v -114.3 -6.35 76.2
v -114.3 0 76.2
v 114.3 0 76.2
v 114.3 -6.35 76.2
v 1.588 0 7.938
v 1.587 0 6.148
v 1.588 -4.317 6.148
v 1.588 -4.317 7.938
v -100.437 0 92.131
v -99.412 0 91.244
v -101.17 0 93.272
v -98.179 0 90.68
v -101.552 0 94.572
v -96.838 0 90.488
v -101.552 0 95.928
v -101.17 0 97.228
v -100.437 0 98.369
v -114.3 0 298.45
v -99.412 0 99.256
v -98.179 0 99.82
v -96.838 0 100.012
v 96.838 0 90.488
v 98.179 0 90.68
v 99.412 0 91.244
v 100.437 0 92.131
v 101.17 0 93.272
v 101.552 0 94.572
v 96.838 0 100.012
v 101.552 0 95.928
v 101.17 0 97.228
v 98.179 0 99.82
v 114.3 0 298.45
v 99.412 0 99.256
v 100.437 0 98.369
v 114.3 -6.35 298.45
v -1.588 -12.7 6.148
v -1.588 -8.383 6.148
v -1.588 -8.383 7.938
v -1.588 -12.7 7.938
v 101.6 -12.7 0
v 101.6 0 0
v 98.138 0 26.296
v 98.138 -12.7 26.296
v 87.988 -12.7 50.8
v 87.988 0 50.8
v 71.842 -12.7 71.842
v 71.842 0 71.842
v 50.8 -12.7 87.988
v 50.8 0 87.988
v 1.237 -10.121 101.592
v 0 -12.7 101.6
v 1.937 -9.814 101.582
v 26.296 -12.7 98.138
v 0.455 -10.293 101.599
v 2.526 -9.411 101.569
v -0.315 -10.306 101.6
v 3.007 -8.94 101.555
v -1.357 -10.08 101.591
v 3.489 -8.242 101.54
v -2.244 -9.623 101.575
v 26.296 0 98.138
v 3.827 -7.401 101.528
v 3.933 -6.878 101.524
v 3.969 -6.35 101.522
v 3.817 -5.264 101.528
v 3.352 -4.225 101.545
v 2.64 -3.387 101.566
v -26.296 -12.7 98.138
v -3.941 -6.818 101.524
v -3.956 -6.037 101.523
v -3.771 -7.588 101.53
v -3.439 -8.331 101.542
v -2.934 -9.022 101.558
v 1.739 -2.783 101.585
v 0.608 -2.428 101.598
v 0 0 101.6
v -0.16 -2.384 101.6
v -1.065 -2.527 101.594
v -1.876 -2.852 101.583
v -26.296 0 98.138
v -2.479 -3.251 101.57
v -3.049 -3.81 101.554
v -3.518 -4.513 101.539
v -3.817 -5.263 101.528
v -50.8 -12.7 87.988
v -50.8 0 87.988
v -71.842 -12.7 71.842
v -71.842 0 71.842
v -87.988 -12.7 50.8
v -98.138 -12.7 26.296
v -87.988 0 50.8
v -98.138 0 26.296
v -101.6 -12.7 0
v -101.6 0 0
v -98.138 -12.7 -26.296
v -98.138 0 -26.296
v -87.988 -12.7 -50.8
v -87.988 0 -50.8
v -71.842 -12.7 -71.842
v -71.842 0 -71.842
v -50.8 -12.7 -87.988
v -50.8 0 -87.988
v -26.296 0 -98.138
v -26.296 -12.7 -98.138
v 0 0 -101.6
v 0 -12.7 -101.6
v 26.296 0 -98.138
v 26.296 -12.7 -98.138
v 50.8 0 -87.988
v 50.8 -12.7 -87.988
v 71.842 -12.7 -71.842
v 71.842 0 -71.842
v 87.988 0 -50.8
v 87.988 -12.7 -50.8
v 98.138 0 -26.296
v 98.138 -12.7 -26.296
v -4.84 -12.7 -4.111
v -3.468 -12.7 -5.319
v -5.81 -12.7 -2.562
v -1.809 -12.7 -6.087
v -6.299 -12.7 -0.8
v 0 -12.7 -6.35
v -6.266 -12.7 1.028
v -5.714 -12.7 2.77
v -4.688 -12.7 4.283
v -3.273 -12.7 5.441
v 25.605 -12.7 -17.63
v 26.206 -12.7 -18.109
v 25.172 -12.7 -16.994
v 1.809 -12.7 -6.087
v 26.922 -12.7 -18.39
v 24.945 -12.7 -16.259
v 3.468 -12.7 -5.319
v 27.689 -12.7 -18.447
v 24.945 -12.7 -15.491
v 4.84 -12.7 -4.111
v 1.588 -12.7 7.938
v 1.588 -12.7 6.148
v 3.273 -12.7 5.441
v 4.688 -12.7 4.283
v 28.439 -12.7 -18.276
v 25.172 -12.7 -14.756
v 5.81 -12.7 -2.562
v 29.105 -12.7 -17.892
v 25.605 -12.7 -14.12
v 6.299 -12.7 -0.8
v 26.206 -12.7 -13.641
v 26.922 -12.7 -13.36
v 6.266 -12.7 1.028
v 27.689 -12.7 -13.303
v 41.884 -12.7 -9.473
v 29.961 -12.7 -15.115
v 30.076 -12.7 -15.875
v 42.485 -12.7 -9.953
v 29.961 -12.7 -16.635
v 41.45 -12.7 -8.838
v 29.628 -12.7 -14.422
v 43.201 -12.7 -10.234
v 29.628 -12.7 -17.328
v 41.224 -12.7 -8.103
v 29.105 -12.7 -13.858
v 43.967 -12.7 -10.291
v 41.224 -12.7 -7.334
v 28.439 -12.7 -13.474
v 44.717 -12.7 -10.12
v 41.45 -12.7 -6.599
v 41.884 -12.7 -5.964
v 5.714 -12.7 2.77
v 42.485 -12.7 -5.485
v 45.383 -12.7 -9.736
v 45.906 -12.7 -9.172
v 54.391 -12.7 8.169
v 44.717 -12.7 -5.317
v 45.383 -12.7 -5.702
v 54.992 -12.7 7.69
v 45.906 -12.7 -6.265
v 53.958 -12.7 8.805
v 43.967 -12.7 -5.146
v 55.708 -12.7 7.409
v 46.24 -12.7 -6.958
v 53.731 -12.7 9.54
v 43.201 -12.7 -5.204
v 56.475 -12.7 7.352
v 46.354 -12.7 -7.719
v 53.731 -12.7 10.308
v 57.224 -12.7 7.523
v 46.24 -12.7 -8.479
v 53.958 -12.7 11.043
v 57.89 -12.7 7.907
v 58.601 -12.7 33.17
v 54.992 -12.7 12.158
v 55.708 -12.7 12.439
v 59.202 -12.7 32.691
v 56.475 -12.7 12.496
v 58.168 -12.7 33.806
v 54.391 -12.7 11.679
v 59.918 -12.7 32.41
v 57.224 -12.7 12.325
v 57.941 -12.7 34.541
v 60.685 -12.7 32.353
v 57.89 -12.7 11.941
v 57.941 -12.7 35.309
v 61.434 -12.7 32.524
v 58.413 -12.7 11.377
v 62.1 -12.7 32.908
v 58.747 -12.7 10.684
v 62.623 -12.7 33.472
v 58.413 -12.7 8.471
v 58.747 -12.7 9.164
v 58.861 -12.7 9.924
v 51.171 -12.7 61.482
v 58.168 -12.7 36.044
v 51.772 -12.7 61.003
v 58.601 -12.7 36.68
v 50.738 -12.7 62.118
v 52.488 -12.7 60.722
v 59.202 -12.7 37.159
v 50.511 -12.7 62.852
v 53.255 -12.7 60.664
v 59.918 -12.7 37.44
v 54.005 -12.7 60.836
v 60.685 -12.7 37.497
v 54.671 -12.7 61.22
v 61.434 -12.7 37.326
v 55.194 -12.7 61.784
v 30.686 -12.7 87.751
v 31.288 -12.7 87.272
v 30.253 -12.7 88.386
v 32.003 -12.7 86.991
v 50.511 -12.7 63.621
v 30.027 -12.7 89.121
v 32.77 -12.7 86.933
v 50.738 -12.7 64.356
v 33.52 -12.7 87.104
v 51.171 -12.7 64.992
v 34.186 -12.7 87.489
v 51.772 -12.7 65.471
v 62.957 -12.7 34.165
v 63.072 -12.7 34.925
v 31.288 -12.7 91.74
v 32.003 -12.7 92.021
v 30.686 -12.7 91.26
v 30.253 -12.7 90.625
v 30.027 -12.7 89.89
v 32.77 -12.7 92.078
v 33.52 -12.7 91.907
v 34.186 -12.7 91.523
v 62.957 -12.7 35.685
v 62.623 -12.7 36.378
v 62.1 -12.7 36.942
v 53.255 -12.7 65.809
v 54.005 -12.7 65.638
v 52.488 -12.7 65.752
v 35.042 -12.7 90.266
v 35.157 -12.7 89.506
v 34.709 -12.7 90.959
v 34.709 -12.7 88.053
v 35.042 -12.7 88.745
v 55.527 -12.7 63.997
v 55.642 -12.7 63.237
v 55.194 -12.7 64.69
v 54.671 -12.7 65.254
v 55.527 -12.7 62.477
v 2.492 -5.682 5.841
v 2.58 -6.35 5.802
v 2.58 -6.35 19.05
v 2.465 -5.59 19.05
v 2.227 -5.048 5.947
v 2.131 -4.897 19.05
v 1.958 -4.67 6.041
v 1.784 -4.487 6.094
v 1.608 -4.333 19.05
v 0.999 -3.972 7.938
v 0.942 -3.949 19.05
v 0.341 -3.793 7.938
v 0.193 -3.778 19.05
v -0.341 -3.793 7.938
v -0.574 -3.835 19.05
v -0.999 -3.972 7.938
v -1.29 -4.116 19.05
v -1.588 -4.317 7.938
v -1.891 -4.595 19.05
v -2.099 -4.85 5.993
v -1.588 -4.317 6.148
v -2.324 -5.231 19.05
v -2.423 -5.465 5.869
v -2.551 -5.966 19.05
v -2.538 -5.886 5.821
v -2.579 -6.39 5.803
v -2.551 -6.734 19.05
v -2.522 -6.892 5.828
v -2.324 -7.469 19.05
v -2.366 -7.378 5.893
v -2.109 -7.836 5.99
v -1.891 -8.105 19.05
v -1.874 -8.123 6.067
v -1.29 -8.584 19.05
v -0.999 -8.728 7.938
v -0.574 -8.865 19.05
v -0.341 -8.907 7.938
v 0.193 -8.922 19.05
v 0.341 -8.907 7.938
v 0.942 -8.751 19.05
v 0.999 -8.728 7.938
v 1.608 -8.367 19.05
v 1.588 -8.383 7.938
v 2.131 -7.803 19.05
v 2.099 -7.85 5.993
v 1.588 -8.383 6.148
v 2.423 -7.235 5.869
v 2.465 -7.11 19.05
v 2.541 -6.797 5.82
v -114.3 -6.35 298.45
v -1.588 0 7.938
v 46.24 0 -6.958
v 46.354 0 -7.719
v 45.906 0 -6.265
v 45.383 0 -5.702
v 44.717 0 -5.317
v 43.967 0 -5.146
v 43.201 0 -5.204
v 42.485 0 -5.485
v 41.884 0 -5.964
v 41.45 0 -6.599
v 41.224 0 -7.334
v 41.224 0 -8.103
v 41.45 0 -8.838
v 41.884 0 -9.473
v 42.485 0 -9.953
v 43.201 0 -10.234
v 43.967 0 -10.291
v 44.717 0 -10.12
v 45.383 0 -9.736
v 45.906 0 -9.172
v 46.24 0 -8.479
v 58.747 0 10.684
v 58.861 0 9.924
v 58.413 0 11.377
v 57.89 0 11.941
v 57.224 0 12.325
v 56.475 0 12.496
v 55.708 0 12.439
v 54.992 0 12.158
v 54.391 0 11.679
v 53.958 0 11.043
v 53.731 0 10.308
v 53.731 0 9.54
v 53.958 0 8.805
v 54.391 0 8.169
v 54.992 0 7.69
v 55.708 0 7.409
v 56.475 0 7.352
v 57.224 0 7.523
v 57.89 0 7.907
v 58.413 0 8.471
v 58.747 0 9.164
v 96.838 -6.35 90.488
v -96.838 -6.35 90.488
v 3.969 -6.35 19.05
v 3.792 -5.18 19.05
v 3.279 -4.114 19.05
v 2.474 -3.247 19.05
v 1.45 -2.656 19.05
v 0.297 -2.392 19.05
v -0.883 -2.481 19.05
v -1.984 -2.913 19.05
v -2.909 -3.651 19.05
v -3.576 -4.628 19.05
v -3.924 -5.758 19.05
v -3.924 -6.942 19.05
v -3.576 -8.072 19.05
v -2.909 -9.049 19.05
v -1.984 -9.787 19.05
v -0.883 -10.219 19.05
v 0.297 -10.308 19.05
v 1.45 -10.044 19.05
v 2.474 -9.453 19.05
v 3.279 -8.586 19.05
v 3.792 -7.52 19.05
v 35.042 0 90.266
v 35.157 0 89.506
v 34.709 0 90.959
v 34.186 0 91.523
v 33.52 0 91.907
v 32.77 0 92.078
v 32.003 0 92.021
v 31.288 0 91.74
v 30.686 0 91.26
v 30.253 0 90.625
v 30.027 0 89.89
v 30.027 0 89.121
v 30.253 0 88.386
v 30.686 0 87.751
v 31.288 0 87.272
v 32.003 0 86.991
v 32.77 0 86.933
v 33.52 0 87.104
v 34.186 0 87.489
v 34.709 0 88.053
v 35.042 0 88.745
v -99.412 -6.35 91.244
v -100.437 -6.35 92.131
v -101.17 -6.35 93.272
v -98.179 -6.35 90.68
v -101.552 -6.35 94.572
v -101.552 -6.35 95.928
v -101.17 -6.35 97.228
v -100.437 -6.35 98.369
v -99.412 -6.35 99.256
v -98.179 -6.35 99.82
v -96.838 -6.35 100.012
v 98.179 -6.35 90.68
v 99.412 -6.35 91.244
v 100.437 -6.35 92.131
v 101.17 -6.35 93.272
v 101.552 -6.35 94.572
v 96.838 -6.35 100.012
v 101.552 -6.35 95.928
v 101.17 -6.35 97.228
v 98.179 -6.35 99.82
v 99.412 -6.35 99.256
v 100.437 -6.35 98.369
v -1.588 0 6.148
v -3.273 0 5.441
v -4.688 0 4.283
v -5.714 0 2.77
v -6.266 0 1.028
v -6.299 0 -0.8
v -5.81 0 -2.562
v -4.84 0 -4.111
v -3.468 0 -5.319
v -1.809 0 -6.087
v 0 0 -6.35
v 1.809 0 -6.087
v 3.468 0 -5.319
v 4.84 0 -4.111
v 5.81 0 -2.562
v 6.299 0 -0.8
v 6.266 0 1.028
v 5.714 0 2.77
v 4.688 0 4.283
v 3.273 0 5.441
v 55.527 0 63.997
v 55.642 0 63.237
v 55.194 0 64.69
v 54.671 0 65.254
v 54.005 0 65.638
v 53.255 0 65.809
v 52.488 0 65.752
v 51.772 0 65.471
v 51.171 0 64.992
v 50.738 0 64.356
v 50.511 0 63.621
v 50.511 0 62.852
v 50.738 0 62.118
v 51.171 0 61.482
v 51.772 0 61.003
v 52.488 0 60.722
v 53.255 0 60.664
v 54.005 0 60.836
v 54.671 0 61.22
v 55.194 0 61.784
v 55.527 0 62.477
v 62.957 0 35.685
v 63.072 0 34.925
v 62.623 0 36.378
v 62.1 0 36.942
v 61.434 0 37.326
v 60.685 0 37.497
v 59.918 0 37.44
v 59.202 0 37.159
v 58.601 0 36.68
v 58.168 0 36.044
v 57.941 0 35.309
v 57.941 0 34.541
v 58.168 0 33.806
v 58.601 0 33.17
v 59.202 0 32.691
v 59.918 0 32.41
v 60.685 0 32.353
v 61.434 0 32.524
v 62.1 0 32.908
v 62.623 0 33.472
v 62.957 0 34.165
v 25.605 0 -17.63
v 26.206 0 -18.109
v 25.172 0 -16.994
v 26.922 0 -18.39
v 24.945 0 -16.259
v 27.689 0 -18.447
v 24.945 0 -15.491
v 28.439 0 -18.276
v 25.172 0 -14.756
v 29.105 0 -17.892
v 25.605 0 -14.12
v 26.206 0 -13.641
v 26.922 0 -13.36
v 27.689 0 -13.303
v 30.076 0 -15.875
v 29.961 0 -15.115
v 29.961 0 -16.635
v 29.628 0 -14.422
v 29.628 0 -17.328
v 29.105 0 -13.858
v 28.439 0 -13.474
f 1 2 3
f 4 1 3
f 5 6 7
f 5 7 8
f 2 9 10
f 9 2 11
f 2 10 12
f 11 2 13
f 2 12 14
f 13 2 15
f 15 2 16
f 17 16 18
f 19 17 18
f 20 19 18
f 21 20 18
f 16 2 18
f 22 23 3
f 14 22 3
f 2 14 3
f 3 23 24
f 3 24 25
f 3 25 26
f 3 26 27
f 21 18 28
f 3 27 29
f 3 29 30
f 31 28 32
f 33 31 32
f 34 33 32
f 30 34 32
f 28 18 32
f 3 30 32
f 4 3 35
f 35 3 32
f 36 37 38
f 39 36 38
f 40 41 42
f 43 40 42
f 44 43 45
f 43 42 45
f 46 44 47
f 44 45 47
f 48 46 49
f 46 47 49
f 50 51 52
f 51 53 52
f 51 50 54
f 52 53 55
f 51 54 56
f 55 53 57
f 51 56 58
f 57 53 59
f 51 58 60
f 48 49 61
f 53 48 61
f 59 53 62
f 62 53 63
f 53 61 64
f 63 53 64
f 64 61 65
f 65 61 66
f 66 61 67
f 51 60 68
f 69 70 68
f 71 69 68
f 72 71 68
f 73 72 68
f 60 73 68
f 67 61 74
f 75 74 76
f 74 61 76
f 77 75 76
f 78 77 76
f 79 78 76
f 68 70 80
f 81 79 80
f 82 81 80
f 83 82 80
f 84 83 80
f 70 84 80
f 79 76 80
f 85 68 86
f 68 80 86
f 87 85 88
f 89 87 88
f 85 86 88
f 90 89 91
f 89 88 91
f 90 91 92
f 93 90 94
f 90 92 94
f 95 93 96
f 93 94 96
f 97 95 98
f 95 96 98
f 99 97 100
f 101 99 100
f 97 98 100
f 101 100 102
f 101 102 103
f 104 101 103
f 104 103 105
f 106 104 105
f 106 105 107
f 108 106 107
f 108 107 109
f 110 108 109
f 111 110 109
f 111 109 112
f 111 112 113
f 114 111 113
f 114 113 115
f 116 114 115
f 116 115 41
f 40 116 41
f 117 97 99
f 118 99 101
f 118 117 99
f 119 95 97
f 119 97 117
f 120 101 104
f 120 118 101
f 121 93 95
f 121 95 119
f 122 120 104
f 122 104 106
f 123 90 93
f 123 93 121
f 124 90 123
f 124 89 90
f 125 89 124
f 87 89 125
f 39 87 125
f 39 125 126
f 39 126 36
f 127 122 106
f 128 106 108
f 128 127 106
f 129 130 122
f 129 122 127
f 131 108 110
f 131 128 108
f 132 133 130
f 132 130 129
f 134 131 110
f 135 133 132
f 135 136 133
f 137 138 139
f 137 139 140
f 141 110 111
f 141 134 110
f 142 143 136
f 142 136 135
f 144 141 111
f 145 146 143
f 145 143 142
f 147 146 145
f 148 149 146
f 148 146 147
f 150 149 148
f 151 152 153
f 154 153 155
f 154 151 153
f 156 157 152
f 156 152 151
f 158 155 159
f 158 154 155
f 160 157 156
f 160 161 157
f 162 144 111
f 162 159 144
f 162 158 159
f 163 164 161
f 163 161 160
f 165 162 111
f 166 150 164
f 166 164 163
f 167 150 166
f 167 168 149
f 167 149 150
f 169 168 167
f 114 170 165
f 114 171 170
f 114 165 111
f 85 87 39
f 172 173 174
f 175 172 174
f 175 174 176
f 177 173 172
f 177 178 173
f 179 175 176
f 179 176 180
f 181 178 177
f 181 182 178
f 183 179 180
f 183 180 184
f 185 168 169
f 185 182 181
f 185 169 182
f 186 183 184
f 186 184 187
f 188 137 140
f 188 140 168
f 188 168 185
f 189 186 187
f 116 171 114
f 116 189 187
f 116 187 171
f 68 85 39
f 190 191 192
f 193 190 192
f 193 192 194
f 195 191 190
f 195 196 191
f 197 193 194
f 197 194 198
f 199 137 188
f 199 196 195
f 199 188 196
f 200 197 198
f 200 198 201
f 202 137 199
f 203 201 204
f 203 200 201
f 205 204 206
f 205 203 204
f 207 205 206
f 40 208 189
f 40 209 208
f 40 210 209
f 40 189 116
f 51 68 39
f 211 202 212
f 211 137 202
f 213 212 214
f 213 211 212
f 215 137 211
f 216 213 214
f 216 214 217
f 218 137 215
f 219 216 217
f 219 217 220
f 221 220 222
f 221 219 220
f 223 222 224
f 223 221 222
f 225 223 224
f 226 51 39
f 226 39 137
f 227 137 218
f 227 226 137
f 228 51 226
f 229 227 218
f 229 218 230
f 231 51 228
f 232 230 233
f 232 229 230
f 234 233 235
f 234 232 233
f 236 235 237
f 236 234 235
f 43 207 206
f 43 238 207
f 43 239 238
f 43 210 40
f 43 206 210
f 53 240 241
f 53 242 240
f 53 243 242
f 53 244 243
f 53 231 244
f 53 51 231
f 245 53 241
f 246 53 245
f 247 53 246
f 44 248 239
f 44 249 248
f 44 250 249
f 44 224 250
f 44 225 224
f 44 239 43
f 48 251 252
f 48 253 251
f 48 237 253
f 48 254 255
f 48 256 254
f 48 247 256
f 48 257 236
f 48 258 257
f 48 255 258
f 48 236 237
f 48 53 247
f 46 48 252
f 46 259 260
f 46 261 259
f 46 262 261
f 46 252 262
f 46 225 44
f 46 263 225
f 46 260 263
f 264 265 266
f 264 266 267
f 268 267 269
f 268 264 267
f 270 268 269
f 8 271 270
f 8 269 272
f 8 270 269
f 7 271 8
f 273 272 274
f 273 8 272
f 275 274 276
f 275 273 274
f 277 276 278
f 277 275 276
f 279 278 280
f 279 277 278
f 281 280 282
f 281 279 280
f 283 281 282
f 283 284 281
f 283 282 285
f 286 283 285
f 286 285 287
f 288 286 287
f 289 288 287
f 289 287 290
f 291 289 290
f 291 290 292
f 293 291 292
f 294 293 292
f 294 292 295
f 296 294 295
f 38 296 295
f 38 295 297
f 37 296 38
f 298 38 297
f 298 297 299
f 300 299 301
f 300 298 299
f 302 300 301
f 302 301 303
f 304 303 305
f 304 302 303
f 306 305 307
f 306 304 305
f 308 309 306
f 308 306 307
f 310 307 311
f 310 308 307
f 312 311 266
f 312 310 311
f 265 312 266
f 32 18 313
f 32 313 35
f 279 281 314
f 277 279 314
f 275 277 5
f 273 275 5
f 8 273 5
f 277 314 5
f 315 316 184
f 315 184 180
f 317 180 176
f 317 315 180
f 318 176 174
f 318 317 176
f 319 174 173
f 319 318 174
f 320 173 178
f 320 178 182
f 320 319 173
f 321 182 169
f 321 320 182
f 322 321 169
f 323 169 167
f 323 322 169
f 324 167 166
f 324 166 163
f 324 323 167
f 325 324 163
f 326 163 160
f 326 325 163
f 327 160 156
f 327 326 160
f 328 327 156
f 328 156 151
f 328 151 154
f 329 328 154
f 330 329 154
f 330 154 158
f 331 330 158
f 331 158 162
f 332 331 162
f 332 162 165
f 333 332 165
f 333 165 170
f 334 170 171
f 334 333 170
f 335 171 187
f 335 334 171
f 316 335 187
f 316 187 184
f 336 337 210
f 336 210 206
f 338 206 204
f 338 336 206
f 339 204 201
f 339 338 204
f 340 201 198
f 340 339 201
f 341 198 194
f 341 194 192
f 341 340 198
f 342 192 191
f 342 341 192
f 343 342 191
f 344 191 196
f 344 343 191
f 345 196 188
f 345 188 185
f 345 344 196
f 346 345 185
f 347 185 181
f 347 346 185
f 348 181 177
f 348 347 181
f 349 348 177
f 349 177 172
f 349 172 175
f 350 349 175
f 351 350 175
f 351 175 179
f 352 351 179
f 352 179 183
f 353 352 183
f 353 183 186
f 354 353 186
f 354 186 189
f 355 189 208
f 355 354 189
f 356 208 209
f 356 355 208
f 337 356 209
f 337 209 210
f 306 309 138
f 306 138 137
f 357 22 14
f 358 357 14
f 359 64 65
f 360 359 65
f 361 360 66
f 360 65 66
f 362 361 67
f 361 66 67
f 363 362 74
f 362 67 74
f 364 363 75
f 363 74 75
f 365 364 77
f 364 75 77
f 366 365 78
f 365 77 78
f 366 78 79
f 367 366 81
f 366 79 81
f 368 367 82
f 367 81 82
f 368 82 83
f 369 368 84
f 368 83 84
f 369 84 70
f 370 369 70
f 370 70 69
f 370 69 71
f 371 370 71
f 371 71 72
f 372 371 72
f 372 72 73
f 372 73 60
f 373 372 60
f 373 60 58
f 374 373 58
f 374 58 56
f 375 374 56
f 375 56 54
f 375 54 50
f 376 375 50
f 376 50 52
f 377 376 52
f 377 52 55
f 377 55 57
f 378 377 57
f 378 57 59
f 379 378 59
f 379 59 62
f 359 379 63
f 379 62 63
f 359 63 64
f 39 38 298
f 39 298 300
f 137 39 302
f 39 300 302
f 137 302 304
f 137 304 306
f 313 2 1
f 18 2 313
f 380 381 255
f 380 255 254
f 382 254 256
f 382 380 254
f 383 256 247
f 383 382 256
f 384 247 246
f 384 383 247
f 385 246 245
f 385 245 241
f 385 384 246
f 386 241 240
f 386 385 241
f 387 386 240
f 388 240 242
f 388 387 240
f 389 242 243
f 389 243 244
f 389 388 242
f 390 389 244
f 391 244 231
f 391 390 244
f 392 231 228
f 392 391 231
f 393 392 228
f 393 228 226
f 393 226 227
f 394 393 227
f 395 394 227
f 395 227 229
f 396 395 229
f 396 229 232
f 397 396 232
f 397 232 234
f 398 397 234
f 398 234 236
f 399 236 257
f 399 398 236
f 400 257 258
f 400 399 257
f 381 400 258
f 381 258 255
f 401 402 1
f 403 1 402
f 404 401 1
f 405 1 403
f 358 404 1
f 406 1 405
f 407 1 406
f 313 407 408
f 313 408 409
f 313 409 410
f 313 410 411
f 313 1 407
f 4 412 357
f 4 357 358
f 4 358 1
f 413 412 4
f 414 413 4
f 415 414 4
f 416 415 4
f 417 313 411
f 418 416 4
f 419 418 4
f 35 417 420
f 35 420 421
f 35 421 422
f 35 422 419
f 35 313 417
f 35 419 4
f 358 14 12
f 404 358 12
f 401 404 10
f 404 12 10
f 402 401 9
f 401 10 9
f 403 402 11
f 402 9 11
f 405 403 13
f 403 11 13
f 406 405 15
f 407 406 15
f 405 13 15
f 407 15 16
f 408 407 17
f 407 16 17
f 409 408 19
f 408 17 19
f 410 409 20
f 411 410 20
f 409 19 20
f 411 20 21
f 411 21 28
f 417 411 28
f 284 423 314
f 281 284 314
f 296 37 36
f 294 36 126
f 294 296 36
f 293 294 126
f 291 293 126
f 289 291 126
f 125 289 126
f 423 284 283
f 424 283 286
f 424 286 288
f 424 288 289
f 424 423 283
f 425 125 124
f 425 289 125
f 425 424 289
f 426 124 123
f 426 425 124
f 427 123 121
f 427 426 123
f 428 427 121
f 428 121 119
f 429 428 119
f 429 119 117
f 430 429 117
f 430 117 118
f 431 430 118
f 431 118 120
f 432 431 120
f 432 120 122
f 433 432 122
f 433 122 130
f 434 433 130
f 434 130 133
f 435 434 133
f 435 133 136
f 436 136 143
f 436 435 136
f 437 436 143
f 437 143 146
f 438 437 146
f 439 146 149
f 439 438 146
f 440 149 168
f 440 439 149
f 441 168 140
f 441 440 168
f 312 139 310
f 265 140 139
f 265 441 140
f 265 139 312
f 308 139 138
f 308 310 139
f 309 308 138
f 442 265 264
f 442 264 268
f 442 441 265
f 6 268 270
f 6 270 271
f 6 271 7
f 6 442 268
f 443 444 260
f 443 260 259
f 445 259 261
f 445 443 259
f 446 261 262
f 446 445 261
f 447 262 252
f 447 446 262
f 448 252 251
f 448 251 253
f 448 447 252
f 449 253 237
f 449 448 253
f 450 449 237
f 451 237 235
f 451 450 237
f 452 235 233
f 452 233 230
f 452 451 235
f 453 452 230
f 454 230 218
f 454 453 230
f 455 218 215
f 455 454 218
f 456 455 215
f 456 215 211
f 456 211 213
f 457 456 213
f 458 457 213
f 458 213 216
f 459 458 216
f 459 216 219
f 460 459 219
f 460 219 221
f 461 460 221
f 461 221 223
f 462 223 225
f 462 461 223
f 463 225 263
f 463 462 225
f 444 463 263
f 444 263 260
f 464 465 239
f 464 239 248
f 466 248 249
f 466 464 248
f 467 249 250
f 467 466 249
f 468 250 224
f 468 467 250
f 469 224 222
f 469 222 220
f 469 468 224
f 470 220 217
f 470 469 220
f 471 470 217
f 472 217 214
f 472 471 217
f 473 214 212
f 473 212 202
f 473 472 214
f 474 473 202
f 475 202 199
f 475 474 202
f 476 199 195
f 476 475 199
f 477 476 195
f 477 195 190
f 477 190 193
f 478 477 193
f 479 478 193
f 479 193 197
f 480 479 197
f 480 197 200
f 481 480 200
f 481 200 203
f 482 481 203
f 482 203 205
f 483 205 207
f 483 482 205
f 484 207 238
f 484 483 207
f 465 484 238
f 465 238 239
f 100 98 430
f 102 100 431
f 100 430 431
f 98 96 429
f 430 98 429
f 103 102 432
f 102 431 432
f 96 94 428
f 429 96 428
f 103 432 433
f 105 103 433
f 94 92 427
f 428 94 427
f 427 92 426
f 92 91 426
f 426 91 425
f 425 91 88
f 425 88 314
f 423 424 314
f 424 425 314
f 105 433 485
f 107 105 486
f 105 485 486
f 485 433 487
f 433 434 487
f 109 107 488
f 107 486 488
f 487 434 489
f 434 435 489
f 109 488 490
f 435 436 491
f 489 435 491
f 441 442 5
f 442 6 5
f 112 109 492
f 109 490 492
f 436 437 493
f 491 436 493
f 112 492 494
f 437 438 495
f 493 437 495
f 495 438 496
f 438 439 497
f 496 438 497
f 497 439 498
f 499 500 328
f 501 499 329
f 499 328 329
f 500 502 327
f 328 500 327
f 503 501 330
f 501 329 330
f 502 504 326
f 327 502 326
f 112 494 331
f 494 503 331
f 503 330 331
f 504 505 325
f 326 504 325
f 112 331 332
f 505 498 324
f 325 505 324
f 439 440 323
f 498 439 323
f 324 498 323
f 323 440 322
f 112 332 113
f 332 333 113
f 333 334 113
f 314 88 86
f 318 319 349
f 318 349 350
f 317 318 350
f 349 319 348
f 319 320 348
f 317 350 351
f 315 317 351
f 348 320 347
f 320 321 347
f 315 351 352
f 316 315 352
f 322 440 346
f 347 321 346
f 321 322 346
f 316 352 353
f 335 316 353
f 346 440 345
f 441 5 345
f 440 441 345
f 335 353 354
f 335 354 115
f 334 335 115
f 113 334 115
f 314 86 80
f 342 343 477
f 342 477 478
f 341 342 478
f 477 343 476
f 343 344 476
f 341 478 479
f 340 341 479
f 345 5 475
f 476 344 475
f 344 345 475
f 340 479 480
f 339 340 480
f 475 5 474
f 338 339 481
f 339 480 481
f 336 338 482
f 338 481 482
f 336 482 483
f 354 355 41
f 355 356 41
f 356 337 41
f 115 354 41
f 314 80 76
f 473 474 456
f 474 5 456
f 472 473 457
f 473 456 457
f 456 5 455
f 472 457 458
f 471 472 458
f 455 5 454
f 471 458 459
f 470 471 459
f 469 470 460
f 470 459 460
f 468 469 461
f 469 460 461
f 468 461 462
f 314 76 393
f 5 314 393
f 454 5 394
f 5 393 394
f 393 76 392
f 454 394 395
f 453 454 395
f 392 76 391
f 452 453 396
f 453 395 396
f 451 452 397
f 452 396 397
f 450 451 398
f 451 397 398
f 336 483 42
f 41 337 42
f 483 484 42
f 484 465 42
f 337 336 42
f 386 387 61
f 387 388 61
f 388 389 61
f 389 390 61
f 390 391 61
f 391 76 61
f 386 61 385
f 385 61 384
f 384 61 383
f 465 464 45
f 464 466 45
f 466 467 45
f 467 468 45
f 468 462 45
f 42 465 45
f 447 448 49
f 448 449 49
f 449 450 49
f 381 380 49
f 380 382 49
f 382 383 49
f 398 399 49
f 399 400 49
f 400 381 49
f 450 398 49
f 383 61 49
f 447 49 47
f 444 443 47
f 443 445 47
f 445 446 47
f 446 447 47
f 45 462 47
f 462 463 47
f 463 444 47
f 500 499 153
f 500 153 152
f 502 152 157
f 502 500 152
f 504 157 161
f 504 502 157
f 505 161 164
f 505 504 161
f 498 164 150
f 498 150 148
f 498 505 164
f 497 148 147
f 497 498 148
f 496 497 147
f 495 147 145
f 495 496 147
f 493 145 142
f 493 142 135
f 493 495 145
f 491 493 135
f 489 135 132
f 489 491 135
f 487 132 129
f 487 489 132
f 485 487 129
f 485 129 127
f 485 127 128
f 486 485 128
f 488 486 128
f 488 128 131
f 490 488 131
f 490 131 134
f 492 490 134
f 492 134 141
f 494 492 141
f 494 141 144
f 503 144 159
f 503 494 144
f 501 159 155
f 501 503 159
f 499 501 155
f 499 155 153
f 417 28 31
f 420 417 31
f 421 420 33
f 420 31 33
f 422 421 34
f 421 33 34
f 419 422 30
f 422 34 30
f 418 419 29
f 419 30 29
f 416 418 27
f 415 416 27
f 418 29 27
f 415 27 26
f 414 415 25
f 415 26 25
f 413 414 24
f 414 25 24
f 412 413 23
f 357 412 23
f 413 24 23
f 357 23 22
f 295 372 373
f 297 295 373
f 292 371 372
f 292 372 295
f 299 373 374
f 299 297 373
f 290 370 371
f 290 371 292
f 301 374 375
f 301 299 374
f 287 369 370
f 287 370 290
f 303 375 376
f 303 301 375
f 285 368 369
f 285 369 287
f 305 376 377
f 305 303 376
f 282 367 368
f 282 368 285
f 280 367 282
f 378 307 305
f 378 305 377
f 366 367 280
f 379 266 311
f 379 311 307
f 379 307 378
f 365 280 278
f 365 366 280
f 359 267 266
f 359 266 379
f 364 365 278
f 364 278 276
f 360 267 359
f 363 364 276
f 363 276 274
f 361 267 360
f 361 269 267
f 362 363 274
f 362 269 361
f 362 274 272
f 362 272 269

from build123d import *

# Parameters (mm, degrees)
F0_R      = 101.6
F0_R_2    = 6.35
F1_DEPTH  = 12.7
F2_W      = 3.175
F2_H      = 3.175
F3_DEPTH  = 12.701
F4_R      = 2.579688
F5_DEPTH  = 12.7
F6_R      = 2.579688
F7_DEPTH  = 25.4
F9_R      = 3.96875
F10_DEPTH = 133.35
F11_W     = 228.6
F11_H     = 222.25
F12_DEPTH = 6.35


with BuildPart() as f1:
    # F0 (on Front) → F1 (new body)
    with BuildSketch(Plane.XZ):
        Circle(F0_R)
        Circle(F0_R_2, mode=Mode.SUBTRACT)
    extrude(amount=F1_DEPTH)

    # F2 (on Front) → F3 (cut, through all)
    with BuildSketch(Plane.XZ):
        with Locations((0, 6.35)):
            Rectangle(F2_W, F2_H)
    extrude(amount=F3_DEPTH, mode=Mode.SUBTRACT)

    # F4 (on Front) → F5 (cut, through all)
    with BuildSketch(Plane.XZ):
        with Locations((32.577419, 89.505722)):
            Circle(F4_R)
        with Locations((53.062117, 63.236969)):
            Circle(F4_R)
        with Locations((60.491874, 34.925)):
            Circle(F4_R)
        with Locations((56.281763, 9.923993)):
            Circle(F4_R)
        with Locations((43.774705, -7.718661)):
            Circle(F4_R)
        with Locations((27.496307, -15.875)):
            Circle(F4_R)
    extrude(amount=F5_DEPTH, mode=Mode.SUBTRACT)

    # F6 (on Top) → F7 (cut)
    with BuildSketch(Plane.XY):
        with Locations((0, -6.35)):
            Circle(F6_R)
    extrude(amount=F7_DEPTH, mode=Mode.SUBTRACT)

    # F9 (on offset) → F10 (cut)
    with BuildSketch(Plane.XY.offset(152.4)):
        with Locations((0, -6.35)):
            Circle(F9_R)
    extrude(amount=-F10_DEPTH, mode=Mode.SUBTRACT)


with BuildPart() as f12:
    # F11 (on Front) → F12 (new body)
    with BuildSketch(Plane.XZ):
        with Locations((0, 187.325)):
            Rectangle(F11_W, F11_H)
        with BuildLine():
            ThreePointArc((96.8375, 100.0125), (101.6, 95.25), (96.8375, 90.4875))
            Line((96.8375, 90.4875), (-96.8375, 90.4875))
            ThreePointArc((-96.8375, 90.4875), (-101.6, 95.25), (-96.8375, 100.0125))
            Line((-96.8375, 100.0125), (96.8375, 100.0125))
        make_face(mode=Mode.SUBTRACT)
    extrude(amount=F12_DEPTH)


solid = Compound([f1.part, f12.part])
